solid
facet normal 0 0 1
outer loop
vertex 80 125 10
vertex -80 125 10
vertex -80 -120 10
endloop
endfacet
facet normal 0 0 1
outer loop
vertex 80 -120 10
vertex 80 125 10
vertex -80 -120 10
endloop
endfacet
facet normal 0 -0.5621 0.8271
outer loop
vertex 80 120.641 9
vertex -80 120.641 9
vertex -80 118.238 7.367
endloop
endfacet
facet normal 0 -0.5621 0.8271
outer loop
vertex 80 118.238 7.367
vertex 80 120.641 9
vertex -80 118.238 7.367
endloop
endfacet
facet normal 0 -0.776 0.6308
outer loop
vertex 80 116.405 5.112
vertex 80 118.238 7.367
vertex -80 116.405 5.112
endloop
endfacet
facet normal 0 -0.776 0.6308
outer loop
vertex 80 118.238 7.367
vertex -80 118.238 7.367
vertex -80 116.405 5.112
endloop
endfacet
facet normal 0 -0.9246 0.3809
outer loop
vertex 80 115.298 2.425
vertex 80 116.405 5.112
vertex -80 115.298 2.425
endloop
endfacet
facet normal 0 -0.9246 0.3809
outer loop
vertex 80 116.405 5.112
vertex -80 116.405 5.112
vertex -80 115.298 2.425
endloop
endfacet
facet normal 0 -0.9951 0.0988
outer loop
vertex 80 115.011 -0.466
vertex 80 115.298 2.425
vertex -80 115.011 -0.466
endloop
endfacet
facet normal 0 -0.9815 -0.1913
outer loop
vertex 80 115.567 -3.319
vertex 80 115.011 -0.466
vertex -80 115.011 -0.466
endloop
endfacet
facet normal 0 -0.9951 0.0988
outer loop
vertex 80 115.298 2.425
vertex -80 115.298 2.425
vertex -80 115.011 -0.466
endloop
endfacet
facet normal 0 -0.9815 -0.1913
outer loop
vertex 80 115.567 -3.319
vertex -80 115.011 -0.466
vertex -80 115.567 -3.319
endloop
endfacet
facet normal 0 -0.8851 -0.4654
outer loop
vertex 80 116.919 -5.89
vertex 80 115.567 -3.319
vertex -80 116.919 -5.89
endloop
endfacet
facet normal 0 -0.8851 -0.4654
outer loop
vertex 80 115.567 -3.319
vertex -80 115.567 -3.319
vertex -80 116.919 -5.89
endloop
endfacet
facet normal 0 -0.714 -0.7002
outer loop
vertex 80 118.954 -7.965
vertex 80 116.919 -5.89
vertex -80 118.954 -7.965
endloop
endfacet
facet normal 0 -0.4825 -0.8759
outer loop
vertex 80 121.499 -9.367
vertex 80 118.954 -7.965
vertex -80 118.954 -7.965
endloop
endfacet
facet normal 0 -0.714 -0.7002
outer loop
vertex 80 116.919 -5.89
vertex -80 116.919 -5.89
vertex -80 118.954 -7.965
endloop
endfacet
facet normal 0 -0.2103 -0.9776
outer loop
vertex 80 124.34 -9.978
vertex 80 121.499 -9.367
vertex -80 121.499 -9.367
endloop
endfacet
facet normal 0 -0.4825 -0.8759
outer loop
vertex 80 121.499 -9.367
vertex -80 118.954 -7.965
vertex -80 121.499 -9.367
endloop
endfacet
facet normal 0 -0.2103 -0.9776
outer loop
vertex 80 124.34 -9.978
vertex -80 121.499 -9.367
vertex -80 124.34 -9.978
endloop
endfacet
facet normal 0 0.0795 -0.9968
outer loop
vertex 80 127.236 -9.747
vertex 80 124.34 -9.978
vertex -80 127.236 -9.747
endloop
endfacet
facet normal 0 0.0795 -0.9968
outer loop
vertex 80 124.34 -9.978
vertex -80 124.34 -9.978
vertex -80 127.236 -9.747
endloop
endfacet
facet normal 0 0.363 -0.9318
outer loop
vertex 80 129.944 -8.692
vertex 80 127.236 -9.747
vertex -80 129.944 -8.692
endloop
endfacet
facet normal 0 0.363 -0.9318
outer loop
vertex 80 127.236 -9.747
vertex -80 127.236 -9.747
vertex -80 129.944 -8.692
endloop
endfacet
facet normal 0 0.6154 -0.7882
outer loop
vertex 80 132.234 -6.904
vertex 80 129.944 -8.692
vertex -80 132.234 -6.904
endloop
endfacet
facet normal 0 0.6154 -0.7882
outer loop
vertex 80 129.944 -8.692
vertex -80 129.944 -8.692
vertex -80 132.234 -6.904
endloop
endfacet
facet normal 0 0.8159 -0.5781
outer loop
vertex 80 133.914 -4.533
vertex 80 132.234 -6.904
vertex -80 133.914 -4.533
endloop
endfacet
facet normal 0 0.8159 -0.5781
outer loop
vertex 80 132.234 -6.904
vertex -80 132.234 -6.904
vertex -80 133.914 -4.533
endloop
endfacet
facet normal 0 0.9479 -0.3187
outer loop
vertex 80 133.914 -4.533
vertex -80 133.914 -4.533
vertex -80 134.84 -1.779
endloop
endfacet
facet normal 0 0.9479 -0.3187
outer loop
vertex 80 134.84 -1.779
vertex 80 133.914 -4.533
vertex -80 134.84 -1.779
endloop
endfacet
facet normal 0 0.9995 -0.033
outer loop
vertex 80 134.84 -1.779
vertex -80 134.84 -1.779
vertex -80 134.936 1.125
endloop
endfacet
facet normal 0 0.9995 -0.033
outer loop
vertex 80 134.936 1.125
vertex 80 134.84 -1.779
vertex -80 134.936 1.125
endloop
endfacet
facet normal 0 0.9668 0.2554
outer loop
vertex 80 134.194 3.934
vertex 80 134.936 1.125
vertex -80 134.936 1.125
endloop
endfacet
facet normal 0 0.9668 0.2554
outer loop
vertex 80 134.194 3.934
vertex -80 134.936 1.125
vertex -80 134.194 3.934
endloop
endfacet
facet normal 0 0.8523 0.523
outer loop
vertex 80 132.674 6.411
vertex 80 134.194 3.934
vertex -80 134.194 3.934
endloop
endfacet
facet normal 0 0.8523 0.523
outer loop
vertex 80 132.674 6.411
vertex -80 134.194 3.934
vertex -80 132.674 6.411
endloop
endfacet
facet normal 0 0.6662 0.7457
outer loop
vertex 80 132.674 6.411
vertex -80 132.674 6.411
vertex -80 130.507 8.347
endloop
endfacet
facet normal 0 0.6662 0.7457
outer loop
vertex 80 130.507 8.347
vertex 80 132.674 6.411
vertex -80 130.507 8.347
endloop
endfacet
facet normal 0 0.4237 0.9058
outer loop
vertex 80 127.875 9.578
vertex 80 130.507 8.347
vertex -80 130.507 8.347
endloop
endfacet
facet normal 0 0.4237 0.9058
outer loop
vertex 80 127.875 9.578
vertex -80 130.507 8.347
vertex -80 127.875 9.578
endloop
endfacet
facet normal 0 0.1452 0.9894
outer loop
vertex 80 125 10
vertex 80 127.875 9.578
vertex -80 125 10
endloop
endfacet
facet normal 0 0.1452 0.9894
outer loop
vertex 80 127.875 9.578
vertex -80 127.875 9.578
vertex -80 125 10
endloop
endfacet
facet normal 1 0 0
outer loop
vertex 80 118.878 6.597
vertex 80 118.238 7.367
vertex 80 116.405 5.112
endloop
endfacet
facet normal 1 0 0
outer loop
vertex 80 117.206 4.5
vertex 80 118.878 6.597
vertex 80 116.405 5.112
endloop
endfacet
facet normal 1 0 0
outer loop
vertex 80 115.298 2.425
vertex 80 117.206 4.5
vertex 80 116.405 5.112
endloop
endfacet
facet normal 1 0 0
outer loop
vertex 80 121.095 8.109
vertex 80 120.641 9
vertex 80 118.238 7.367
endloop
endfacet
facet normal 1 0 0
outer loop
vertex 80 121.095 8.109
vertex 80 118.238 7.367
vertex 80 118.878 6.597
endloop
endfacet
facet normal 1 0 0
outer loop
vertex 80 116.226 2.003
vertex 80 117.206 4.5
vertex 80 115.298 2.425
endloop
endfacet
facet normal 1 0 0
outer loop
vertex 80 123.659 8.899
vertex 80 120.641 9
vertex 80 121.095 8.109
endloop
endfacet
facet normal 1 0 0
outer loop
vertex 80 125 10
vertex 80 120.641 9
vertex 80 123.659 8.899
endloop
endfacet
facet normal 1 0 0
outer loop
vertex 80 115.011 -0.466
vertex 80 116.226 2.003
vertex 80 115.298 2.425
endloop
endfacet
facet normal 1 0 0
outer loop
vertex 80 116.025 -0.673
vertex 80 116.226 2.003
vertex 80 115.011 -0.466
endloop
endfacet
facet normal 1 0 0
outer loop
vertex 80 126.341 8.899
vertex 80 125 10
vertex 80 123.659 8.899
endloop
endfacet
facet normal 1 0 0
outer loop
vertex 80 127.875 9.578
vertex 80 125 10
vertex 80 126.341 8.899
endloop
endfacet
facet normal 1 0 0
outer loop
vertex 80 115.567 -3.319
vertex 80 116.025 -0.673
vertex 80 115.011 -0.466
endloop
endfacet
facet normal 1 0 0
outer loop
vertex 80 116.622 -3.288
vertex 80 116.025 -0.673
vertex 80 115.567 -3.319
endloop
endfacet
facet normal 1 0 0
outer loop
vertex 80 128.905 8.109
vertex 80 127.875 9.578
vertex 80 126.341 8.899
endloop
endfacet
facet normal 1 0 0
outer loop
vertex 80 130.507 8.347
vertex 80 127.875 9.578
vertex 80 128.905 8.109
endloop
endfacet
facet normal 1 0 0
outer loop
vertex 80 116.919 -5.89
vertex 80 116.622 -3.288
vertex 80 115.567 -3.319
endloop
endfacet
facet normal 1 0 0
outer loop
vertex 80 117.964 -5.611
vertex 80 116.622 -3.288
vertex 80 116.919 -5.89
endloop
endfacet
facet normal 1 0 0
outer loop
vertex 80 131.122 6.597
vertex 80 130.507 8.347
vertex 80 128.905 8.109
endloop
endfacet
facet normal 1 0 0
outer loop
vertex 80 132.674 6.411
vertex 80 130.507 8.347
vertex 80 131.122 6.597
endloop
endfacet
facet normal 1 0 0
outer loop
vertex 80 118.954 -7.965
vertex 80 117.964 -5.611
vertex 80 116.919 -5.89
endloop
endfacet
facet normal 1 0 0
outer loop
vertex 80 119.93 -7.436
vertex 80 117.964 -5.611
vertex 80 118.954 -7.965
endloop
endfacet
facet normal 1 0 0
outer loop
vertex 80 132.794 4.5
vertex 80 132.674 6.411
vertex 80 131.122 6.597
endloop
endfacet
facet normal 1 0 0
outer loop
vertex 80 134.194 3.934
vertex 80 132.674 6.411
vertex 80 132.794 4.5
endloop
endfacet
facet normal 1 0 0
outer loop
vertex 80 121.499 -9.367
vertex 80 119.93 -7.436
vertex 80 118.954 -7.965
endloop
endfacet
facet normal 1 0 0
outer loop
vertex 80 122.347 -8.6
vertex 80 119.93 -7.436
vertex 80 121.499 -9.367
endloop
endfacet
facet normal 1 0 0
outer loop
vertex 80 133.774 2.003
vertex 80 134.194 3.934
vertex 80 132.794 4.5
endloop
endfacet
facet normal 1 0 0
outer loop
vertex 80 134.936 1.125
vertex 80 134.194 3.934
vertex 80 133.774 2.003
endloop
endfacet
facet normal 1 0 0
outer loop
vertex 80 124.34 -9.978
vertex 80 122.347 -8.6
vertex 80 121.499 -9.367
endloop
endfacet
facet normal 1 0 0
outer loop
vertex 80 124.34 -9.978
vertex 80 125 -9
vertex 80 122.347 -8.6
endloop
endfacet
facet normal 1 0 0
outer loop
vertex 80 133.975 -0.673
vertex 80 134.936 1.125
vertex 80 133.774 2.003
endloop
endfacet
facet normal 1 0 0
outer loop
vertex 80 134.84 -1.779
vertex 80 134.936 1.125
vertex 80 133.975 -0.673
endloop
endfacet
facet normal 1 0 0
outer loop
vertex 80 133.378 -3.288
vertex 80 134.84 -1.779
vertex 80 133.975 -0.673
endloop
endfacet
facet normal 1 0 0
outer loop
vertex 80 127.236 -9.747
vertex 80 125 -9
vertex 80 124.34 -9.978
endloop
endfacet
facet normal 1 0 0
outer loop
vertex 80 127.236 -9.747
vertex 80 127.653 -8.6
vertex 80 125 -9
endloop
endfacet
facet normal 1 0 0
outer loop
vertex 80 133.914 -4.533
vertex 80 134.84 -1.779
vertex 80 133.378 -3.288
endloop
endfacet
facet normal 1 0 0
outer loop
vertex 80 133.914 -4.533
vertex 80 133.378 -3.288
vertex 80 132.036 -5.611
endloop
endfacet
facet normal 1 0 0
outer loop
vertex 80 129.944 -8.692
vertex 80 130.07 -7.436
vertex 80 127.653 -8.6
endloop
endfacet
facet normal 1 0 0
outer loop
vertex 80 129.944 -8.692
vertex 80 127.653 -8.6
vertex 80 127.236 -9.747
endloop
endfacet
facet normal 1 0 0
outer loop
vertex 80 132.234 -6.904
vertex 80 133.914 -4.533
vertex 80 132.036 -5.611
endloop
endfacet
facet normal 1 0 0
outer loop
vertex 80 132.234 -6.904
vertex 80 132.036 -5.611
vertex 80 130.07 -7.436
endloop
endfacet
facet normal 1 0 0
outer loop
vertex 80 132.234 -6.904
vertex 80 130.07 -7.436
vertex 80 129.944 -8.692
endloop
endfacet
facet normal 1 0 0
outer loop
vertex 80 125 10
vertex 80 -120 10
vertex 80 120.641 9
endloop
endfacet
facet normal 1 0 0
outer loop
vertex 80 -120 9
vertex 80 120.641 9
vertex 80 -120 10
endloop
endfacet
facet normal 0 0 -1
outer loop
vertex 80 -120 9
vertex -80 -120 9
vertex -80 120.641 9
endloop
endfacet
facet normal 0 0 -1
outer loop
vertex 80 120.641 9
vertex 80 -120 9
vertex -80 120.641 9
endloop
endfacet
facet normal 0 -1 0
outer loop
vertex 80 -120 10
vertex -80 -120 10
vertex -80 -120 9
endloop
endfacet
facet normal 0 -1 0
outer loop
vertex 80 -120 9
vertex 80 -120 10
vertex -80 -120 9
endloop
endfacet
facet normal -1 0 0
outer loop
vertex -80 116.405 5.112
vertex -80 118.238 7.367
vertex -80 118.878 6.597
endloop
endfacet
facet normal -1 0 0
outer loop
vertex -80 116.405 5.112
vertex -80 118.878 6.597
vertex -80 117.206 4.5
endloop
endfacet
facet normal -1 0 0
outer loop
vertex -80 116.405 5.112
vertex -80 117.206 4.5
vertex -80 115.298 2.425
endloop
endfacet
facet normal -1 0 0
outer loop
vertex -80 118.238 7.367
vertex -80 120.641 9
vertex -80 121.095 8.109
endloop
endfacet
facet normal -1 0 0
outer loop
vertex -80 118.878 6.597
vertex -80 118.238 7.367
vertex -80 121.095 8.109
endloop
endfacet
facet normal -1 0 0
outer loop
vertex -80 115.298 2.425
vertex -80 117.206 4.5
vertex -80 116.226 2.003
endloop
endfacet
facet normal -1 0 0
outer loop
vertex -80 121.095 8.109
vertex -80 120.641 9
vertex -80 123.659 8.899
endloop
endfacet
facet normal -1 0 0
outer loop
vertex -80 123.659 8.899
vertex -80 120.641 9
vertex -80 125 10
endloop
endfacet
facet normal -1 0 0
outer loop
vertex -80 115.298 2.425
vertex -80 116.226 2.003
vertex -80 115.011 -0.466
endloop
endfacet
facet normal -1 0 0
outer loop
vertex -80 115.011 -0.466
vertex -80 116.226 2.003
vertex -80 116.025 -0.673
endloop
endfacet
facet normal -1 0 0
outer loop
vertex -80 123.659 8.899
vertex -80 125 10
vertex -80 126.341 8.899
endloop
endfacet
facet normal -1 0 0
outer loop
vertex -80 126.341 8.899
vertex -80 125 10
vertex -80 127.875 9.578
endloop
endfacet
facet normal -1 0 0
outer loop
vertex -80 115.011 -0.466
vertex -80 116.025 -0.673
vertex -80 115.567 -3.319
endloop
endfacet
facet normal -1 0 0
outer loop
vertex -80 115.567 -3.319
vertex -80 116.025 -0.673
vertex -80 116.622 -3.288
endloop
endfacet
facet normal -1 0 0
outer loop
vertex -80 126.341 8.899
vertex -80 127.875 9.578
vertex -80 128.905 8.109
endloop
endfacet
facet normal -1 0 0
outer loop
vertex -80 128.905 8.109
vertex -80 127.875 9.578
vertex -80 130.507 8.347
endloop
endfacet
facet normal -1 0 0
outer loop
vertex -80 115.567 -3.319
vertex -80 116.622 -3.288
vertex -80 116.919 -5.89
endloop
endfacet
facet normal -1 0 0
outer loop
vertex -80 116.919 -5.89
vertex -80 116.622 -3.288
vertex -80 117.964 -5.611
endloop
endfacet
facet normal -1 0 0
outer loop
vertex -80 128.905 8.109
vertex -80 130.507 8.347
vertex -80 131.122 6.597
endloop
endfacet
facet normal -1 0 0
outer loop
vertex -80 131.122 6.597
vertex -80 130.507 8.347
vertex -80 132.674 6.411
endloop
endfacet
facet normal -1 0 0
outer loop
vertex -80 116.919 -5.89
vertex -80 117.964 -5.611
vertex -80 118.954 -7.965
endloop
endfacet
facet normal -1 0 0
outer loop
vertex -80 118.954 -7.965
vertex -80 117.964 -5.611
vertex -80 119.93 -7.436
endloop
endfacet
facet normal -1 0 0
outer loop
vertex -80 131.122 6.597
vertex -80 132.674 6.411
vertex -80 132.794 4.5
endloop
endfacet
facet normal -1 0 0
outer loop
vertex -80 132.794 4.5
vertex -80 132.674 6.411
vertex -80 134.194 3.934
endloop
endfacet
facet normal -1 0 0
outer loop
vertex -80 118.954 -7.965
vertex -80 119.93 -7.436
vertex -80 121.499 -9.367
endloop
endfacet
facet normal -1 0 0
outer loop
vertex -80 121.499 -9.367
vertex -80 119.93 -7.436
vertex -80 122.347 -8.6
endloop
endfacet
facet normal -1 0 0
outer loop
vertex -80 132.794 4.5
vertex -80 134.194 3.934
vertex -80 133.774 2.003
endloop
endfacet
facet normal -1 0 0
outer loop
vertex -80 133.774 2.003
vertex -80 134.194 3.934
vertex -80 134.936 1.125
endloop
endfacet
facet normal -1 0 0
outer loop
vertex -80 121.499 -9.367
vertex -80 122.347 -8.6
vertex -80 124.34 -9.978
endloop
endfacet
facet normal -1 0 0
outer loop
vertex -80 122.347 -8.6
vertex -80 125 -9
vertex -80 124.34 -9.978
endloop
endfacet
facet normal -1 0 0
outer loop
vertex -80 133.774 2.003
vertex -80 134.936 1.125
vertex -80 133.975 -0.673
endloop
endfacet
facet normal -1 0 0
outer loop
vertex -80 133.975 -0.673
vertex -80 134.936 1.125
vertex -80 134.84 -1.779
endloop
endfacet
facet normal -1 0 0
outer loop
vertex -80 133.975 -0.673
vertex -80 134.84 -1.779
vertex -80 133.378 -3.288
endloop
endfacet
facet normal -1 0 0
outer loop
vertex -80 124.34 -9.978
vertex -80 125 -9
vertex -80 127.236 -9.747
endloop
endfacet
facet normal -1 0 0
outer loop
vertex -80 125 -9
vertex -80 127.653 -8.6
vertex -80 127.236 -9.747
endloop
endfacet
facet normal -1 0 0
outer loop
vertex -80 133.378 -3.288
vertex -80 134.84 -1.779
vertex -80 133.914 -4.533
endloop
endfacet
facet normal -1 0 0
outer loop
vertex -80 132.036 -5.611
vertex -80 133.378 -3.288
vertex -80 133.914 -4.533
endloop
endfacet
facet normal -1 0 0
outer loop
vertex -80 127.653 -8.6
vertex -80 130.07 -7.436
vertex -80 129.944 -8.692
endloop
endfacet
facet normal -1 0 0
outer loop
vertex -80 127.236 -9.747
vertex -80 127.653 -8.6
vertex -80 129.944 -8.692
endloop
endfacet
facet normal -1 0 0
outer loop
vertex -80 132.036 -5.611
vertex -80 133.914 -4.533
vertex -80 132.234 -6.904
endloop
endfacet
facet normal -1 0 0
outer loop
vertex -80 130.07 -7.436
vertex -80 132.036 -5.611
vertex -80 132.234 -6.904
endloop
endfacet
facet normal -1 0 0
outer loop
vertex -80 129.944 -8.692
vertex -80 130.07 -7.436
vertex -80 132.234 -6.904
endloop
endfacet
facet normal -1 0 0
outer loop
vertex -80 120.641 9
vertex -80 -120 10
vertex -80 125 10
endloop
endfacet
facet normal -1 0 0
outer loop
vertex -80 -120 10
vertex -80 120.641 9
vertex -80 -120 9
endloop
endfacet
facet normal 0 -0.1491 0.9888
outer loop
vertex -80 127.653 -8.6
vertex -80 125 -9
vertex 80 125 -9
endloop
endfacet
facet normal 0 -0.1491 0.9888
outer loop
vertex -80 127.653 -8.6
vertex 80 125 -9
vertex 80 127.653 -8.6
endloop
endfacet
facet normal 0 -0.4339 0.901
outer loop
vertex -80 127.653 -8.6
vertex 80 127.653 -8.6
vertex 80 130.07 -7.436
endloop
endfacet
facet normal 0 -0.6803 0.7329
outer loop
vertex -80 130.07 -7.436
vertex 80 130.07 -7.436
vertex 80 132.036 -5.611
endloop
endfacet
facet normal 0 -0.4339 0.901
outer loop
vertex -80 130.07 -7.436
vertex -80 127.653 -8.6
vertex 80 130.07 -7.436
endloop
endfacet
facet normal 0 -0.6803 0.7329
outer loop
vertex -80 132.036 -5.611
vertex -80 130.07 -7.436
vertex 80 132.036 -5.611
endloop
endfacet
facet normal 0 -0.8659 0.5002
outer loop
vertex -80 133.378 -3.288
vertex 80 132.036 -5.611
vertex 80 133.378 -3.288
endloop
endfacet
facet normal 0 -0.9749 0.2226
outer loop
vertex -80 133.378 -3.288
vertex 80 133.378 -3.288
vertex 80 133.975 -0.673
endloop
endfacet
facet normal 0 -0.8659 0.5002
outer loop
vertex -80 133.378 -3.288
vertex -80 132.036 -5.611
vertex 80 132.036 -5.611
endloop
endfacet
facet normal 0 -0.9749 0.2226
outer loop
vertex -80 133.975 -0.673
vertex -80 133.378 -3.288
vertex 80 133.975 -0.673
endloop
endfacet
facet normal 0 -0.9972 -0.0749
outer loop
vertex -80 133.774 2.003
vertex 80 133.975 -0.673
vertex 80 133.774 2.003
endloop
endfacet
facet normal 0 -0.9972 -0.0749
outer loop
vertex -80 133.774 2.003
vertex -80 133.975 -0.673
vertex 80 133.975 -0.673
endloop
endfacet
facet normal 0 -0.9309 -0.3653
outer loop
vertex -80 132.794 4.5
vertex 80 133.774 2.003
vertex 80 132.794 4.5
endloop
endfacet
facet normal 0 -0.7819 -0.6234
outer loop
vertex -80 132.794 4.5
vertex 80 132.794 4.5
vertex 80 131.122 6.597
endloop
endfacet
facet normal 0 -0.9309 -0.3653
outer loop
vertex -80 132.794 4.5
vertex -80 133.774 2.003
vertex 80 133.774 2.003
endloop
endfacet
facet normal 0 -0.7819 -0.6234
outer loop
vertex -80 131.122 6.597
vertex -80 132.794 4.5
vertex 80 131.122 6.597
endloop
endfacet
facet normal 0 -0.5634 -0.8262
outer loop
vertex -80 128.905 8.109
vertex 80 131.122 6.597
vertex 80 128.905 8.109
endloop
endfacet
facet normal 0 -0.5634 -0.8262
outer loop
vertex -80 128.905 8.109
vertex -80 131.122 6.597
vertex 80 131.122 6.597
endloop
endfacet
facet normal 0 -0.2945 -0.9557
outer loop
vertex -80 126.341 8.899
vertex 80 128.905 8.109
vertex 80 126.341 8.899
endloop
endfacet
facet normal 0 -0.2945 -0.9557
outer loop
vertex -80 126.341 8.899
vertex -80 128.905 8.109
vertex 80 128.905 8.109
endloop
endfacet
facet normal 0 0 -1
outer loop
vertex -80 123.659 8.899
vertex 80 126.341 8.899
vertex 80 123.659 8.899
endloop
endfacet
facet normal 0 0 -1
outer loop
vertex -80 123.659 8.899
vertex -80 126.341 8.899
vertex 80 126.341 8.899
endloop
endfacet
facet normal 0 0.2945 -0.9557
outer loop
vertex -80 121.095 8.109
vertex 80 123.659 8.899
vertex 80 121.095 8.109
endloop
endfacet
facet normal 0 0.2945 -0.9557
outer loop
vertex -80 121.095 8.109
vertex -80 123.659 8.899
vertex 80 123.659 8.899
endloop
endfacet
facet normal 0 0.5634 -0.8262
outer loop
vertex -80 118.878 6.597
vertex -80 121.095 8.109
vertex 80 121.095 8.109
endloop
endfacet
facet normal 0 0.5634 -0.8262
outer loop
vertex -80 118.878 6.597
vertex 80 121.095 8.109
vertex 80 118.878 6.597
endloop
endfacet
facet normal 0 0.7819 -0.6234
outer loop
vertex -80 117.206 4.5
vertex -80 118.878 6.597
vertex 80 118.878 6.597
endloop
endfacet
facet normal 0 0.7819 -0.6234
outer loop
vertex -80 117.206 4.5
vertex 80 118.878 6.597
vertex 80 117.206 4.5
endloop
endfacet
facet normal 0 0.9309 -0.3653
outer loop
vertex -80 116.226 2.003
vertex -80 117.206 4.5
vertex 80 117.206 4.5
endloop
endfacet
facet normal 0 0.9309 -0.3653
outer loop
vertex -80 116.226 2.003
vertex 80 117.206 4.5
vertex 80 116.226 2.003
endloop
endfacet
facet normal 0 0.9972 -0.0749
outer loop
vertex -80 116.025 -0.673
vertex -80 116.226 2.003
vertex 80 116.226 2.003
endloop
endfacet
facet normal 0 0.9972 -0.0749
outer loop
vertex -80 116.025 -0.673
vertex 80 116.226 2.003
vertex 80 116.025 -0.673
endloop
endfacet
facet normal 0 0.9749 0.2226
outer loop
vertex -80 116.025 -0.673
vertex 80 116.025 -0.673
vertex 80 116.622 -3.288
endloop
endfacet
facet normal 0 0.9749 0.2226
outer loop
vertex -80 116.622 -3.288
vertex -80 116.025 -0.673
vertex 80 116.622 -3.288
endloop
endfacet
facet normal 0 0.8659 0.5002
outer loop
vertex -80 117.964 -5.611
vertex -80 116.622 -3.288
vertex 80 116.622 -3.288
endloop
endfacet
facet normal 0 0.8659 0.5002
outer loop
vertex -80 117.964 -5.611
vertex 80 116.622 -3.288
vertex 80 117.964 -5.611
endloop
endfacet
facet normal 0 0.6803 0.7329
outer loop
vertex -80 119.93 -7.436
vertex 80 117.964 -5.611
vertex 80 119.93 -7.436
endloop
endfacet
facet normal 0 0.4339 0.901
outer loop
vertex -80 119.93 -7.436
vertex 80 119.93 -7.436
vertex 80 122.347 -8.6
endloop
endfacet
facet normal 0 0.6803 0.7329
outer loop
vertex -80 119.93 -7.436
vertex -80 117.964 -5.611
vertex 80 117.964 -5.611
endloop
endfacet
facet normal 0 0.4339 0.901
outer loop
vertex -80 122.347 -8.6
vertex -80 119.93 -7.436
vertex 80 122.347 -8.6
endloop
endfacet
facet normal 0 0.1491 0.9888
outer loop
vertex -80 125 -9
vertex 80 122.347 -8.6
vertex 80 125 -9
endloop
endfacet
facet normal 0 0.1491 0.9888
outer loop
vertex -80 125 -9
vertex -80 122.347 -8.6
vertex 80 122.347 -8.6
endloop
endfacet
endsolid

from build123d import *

# Parameters (mm, degrees)
BOSS_EXTRUDE1_DEPTH      = 80
BOSS_EXTRUDE1_DEPTH_BACK = 80
SKETCH1_R                = 9


with BuildPart() as part:
    # Sketch1 → Boss-Extrude1 (new, two sides: drawn at the far end of the back side and taken through both)
    with BuildSketch(Plane(origin=(0, 0, 0), x_dir=(0, 0, -1), z_dir=(1, 0, 0)).offset(-BOSS_EXTRUDE1_DEPTH_BACK)):
        with BuildLine():
            Line((-10, 125), (-10, -120))
            Line((-10, -120), (-9, -120))
            Line((-9, -120), (-9, 120.641101056))
            ThreePointArc((-9, 120.641101056), (9.746794345, 127.236067977), (-10, 125))
        make_face()
        with Locations((0, 125)):
            Circle(SKETCH1_R, mode=Mode.SUBTRACT)
    extrude(amount=BOSS_EXTRUDE1_DEPTH + BOSS_EXTRUDE1_DEPTH_BACK)


solid = part.part
